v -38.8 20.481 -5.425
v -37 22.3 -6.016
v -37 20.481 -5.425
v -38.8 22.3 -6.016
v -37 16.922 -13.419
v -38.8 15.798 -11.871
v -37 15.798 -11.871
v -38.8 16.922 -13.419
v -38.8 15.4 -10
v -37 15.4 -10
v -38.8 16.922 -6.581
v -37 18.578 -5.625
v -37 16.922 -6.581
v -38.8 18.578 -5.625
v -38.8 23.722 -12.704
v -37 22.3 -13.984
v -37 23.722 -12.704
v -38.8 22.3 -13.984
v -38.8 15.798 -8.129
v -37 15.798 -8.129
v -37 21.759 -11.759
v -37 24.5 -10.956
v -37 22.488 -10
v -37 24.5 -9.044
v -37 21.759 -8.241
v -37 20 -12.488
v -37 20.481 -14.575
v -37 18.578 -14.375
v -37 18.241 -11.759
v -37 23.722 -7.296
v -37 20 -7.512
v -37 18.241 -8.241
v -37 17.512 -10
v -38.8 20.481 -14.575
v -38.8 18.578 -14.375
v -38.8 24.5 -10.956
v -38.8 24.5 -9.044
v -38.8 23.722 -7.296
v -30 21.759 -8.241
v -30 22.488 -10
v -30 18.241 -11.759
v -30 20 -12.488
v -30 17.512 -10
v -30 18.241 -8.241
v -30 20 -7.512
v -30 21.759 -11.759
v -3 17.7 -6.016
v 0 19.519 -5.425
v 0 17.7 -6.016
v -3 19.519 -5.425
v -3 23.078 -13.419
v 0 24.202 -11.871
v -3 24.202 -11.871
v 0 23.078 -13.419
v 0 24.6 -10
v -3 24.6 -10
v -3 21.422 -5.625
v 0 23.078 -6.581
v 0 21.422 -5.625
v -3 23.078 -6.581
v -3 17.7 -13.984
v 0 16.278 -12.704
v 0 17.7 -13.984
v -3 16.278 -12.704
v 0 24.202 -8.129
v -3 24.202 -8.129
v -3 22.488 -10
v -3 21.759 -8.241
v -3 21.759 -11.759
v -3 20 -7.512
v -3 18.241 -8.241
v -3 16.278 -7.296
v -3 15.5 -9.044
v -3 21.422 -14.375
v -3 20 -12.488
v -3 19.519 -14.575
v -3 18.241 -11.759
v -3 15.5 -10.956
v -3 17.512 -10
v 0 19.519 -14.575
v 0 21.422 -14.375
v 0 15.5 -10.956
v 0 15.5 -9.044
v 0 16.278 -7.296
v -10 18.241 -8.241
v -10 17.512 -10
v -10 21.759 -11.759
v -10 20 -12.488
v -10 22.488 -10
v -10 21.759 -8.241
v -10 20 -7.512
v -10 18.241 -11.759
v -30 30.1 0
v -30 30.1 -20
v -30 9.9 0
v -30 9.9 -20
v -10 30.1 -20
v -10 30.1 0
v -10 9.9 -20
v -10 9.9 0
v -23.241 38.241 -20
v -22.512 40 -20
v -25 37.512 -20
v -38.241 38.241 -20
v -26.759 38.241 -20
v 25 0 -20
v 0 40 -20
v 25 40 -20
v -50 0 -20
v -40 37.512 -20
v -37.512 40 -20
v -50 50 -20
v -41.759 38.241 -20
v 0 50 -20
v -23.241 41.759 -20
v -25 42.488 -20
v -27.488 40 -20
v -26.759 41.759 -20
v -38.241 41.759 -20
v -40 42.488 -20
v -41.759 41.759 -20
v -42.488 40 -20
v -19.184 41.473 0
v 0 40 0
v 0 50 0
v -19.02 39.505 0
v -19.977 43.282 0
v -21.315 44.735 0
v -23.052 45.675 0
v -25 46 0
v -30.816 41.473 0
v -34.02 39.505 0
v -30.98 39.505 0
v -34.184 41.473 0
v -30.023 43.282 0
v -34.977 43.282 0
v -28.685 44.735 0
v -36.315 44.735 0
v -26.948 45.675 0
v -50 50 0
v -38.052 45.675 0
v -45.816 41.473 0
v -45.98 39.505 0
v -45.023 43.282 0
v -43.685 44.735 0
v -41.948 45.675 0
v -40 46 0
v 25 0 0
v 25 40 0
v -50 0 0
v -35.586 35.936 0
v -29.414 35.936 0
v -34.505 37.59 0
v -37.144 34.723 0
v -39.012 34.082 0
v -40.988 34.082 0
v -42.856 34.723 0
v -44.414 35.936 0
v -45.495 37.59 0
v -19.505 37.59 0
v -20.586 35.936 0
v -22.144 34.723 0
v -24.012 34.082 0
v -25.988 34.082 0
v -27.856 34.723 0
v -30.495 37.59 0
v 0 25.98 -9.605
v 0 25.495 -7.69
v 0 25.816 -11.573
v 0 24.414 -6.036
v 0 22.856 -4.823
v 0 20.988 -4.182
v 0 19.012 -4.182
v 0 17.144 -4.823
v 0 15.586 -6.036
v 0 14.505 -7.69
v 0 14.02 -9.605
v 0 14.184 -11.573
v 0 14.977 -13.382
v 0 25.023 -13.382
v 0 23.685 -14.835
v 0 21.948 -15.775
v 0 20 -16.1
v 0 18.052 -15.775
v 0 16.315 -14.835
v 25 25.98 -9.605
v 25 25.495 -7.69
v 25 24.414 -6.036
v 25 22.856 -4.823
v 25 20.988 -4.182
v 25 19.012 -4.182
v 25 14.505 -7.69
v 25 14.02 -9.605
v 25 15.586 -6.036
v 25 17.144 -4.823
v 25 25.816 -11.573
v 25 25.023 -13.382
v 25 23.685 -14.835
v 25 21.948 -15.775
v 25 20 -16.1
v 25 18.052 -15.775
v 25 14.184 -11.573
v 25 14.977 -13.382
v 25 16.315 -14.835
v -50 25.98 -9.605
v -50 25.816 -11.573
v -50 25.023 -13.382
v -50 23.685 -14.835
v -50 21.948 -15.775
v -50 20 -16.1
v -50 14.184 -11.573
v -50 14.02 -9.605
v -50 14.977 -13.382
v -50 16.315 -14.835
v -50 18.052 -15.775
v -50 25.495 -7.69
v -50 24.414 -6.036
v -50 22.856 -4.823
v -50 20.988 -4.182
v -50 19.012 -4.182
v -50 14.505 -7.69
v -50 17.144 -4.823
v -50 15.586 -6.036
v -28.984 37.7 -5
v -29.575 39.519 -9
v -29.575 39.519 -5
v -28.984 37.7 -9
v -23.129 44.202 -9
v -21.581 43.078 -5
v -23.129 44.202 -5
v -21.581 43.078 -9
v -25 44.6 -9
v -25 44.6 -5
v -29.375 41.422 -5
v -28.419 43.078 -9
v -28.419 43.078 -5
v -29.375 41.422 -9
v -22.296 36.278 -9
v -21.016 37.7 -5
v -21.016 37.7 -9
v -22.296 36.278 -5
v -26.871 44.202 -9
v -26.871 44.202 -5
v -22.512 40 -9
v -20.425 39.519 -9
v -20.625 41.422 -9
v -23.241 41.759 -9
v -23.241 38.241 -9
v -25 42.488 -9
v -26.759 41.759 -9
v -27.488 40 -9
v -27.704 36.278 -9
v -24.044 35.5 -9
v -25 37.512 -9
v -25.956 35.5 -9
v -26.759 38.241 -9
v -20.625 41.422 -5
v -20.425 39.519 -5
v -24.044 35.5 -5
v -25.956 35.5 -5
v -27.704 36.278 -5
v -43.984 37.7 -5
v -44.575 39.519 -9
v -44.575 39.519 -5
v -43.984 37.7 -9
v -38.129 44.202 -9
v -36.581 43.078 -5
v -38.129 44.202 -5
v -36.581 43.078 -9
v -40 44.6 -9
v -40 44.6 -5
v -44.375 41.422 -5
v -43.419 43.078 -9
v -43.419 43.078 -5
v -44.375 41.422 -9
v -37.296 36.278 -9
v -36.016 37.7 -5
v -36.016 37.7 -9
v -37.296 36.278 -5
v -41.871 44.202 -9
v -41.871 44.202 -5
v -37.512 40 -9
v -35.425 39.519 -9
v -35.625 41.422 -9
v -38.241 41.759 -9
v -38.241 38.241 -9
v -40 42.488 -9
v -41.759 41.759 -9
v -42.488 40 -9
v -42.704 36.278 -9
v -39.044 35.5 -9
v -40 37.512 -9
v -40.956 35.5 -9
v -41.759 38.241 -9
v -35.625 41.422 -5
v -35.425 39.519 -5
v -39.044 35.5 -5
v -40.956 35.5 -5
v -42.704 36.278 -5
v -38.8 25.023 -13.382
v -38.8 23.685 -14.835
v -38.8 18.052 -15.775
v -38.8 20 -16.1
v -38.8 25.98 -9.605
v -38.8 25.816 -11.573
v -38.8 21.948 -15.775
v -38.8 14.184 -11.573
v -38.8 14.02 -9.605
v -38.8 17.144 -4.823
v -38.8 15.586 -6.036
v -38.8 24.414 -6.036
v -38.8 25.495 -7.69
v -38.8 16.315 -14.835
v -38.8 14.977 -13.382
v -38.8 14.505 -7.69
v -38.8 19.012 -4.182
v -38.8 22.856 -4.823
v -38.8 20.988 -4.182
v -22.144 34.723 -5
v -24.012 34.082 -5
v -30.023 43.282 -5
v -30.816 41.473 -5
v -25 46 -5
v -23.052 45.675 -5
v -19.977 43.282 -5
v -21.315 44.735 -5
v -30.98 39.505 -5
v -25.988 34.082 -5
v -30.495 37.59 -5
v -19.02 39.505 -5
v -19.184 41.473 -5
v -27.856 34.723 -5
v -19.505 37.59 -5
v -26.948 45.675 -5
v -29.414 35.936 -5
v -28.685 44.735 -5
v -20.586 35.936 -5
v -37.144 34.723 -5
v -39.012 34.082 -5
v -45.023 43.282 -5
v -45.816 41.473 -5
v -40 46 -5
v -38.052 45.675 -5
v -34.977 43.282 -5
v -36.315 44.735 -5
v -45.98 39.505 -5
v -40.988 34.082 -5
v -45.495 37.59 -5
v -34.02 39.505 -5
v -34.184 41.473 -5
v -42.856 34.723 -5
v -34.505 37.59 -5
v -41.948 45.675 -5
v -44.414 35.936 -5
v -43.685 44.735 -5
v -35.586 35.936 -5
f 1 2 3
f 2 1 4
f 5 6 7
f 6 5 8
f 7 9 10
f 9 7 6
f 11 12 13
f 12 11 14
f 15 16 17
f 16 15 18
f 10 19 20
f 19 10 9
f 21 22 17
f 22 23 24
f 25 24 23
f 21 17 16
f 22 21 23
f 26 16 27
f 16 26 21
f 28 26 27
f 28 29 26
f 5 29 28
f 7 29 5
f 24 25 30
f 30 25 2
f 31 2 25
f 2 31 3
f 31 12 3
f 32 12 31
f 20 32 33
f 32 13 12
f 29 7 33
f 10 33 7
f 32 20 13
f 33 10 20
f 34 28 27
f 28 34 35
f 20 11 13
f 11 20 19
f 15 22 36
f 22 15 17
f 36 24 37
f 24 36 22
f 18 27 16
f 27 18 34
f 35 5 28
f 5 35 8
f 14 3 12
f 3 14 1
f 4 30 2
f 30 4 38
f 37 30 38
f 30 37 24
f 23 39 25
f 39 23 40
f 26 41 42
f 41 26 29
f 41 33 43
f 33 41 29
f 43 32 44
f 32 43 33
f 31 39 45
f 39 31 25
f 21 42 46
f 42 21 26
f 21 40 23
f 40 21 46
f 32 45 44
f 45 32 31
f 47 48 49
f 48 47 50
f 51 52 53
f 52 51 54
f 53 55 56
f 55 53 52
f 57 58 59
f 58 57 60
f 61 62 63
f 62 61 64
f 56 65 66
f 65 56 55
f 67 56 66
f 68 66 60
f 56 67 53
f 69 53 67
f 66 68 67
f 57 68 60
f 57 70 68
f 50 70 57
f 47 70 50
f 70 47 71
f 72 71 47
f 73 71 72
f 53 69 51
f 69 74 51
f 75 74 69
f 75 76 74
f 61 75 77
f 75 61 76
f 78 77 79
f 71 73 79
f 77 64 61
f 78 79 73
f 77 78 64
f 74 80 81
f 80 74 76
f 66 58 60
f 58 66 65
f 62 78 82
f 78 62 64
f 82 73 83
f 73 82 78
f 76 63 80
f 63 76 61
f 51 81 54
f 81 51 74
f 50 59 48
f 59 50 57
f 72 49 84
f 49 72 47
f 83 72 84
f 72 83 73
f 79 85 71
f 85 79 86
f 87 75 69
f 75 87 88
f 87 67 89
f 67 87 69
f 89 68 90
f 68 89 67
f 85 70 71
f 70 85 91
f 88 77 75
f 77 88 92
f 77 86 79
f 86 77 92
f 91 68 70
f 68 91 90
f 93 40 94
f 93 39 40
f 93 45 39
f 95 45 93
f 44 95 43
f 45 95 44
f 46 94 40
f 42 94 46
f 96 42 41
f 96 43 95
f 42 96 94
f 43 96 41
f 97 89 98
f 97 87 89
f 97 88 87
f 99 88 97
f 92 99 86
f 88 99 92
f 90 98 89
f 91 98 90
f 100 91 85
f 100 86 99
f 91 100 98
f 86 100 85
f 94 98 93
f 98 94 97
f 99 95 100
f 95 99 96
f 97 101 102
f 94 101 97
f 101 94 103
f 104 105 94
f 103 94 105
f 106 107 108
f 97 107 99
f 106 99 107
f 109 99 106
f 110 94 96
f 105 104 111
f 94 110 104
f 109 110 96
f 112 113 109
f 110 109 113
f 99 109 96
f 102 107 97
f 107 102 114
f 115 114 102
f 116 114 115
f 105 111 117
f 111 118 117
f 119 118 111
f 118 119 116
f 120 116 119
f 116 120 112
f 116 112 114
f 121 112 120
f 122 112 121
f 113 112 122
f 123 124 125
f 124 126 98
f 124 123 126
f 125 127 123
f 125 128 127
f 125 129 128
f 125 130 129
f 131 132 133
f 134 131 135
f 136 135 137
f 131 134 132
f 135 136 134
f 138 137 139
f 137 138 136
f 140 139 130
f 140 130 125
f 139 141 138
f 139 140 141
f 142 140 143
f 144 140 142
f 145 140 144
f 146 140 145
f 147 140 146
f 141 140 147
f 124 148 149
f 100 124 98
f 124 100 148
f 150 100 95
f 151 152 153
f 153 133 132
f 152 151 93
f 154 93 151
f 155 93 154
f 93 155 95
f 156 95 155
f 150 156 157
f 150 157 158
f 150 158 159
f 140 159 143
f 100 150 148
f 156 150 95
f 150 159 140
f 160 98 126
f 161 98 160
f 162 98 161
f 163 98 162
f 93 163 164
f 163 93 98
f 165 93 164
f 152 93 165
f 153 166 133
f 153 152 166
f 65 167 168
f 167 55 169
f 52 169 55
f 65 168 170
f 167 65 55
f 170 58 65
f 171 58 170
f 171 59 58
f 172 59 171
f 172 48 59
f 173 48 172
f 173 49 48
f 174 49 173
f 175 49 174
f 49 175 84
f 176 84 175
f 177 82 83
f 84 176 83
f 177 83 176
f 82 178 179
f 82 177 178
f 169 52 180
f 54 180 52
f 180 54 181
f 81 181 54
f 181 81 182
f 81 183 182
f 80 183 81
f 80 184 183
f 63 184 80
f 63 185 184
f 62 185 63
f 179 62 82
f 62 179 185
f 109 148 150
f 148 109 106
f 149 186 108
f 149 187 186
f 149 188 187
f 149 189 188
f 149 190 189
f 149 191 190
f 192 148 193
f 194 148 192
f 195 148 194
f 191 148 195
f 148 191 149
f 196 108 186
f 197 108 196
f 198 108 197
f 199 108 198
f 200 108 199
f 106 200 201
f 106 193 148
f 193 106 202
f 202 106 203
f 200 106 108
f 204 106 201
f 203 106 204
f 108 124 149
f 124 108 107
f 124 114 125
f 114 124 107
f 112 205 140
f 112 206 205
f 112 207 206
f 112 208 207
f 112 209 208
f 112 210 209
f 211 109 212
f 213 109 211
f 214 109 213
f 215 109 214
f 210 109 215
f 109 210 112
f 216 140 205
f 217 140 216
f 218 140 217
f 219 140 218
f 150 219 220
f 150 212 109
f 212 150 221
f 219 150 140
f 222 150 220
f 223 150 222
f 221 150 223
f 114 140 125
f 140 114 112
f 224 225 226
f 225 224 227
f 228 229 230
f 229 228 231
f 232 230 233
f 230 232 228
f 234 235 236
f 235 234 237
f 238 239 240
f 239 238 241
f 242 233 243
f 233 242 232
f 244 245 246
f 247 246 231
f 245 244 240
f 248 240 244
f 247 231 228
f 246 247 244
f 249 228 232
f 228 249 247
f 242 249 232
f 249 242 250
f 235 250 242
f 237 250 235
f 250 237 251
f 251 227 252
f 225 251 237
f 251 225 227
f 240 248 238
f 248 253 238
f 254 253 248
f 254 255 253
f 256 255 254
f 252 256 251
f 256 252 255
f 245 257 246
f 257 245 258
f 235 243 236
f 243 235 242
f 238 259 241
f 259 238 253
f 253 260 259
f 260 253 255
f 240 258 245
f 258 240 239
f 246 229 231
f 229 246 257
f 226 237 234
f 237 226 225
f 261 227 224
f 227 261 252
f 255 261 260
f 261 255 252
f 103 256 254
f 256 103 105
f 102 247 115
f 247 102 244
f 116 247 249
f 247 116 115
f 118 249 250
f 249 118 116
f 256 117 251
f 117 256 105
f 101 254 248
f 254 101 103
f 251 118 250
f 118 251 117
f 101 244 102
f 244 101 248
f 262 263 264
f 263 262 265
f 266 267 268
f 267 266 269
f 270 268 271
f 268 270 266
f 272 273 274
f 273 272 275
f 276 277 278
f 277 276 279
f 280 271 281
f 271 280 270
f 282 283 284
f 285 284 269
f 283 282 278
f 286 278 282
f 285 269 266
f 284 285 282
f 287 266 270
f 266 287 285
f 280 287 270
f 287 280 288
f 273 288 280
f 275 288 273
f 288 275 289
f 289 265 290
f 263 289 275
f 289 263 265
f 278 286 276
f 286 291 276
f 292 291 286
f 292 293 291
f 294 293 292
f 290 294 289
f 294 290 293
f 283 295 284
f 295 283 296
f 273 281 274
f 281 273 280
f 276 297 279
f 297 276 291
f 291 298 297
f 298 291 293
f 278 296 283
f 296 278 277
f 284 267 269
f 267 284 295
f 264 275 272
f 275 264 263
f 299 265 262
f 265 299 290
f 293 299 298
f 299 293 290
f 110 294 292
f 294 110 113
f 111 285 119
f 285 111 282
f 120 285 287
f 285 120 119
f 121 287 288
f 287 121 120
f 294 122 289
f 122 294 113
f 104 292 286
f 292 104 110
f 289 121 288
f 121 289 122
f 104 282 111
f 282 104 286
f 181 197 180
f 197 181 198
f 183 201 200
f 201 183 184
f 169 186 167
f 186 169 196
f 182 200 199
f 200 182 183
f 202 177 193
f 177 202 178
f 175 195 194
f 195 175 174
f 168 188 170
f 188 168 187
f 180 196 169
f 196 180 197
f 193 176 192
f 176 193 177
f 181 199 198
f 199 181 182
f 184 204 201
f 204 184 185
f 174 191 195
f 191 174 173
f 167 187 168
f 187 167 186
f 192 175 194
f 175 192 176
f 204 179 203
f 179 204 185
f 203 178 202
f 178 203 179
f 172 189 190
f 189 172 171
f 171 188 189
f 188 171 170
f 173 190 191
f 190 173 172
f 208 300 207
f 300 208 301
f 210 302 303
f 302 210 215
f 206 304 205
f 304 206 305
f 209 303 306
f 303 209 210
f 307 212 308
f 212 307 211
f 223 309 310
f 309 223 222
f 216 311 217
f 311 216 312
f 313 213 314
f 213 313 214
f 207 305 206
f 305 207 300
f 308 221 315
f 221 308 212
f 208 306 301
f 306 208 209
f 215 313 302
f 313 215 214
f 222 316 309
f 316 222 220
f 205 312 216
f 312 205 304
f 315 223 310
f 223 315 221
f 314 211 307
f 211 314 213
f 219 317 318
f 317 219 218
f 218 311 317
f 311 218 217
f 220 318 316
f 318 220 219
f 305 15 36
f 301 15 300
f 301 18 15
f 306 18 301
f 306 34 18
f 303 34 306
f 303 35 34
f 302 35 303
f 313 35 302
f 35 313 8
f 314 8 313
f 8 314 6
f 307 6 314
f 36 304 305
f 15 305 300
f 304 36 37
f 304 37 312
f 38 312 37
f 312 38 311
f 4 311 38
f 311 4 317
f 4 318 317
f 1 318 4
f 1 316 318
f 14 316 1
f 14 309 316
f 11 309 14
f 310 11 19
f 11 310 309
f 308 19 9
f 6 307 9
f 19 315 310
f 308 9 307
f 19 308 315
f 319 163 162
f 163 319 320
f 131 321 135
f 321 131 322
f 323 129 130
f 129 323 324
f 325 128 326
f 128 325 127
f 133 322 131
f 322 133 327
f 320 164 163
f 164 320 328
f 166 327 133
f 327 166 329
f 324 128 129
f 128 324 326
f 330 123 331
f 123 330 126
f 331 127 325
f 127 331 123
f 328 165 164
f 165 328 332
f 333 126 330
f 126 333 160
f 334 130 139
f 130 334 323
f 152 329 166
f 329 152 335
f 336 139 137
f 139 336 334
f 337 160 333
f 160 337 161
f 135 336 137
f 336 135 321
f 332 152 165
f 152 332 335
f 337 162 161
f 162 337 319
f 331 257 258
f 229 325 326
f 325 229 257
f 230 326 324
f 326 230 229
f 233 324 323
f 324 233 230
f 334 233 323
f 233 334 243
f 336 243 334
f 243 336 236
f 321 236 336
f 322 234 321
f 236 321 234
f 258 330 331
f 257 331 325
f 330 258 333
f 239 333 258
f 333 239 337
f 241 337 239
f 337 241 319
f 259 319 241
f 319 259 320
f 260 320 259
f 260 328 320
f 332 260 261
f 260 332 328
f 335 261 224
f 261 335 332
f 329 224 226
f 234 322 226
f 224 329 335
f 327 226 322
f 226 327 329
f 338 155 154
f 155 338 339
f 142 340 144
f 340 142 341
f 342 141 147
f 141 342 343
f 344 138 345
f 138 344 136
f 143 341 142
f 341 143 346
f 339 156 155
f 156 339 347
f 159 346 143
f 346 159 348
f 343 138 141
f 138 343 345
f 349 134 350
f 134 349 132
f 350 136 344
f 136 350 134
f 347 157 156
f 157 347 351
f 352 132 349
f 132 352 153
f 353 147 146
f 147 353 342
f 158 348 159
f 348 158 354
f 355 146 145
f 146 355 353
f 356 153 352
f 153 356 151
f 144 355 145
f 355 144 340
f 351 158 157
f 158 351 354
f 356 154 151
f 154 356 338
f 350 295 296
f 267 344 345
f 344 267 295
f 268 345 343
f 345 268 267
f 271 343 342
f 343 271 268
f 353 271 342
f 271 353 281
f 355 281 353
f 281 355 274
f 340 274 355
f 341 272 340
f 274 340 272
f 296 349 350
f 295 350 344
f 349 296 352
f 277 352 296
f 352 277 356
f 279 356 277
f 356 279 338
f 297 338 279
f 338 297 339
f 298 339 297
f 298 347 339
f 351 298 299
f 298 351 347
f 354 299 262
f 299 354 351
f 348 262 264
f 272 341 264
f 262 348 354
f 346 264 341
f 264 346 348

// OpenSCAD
// file: MCAD/constants.scad
// MIT license


TAU = 6.2831853071; //2*PI, see http://tauday.com/
PI = TAU/2;

// translates a imperial measurement in inches to meters
mm_per_inch = 25.4;
// file: MCAD/math.scad
// MIT license

include <constants.scad>

function deg(angle) = 360*angle/TAU;
// file: bom.scad
module bom(code, desc, category) {
	echo(str("BOM: ",code," - ", desc, "; ", category));
}
// file: MCAD/shapes.scad
/*
 *  OpenSCAD Shapes Library (www.openscad.org)
 *  Copyright (C) 2009  Catarina Mota
 *  Copyright (C) 2010  Elmo Mäntynen
 *
 *  License: LGPL 2.1 or later
*/

// 2D Shapes
//ngon(sides, radius, center=false);

// 3D Shapes
//box(width, height, depth);
//roundedBox(width, height, depth, factor);
//cone(height, radius);
//ellipticalCylinder(width, height, depth);
//ellipsoid(width, height);
//tube(height, radius, wall, center = false);
//tube2(height, ID, OD, center = false);
//ovalTube(width, height, depth, wall, center = false);
//hexagon(height, depth);
//octagon(height, depth);
//dodecagon(height, depth);
//hexagram(height, depth);
//rightTriangle(adjacent, opposite, depth);
//equiTriangle(side, depth);
//12ptStar(height, depth);

//----------------------

// size is a vector [w, h, d]
module box(width, height, depth) {
  cube([width, height, depth], true);
}

// size is a vector [w, h, d]
module roundedBox(width, height, depth, radius) {
  size=[width, height, depth];
  cube(size - [2*radius,0,0], true);
  cube(size - [0,2*radius,0], true);
  for (x = [radius-size[0]/2, -radius+size[0]/2],
       y = [radius-size[1]/2, -radius+size[1]/2]) {
    translate([x,y,0]) cylinder(r=radius, h=size[2], center=true);
  }
}

module cone(height, radius, center = false) {
  cylinder(height, radius, 0, center);
}

module ellipticalCylinder(w,h, height, center = false) {
  scale([1, h/w, 1]) cylinder(h=height, r=w, center=center);
}

module ellipsoid(w, h, center = false) {
  scale([1, h/w, 1]) sphere(r=w/2, center=center);
}

// wall is wall thickness
module tube(height, radius, wall, center = false) {
  difference() {
    cylinder(h=height, r=radius, center=center);
    cylinder(h=height, r=radius-wall, center=center);
  }
}

// wall is wall thickness
module tube2(height, ID, OD, center = false) {
  difference() {
    cylinder(h=height, r=OD/2, center=center);
    cylinder(h=height, r=ID/2, center=center);
  }
}

// wall is wall thickness
module ovalTube(height, rx, ry, wall, center = false) {
  difference() {
    scale([1, ry/rx, 1]) cylinder(h=height, r=rx, center=center);
    scale([(rx-wall)/rx, (ry-wall)/rx, 1]) cylinder(h=height, r=rx, center=center);
  }
}

// size is the XY plane size, height in Z
module hexagon(size, height) {
  boxWidth = size/1.75;
  for (r = [-60, 0, 60]) rotate([0,0,r]) cube([boxWidth, size, height], true);
}

// size is the XY plane size, height in Z
module octagon(size, height) {
  intersection() {
    cube([size, size, height], true);
    rotate([0,0,45]) cube([size, size, height], true);
  }
}

// size is the XY plane size, height in Z
module dodecagon(size, height) {
  intersection() {
    hexagon(size, height);
    rotate([0,0,90]) hexagon(size, height);
  }
}

// size is the XY plane size, height in Z
module hexagram(size, height) {
  boxWidth=size/1.75;
  for (v = [[0,1],[0,-1],[1,-1]]) {
    intersection() {
      rotate([0,0,60*v[0]]) cube([size, boxWidth, height], true);
      rotate([0,0,60*v[1]]) cube([size, boxWidth, height], true);
    }
  }
}

module rightTriangle(adjacent, opposite, height) {
  difference() {
    translate([-adjacent/2,opposite/2,0]) cube([adjacent, opposite, height], true);
    translate([-adjacent,0,0]) {
      rotate([0,0,atan(opposite/adjacent)]) dislocateBox(adjacent*2, opposite, height+2);
    }
  }
}

module equiTriangle(side, height) {
  difference() {
    translate([-side/2,side/2,0]) cube([side, side, height], true);
    rotate([0,0,30]) dislocateBox(side*2, side, height);
    translate([-side,0,0]) {
      rotate([0,0,60]) dislocateBox(side*2, side, height);
    }
  }
}

module 12ptStar(size, height) {
  starNum = 3;
  starAngle = 360/starNum;
  for (s = [1:starNum]) {
    rotate([0, 0, s*starAngle]) cube([size, size, height], true);
  }
}

//-----------------------
//MOVES THE ROTATION AXIS OF A BOX FROM ITS CENTER TO THE BOTTOM LEFT CORNER
module dislocateBox(w, h, d) {
  translate([0,0,-d/2]) cube([w,h,d]);
}

//-----------------------
// Tests
//module test2D_ellipse(){ellipse(10, 5);}
module test_ellipsoid(){ellipsoid(10, 5);}

//module test2D_egg_outline(){egg_outline();}
// file: MCAD/motors.scad
// Copyright 2010 D1plo1d

// This library is dual licensed under the GPL 3.0 and the GNU Lesser General Public License as per http://creativecommons.org/licenses/LGPL/2.1/ .

include <math.scad>


//generates a motor mount for the specified nema standard #.
module stepper_motor_mount(nema_standard,slide_distance=0, mochup=true, tolerance=0) {
	//dimensions from:
	// http://www.numberfactory.com/NEMA%20Motor%20Dimensions.htm
	if (nema_standard == 17)
	{
		_stepper_motor_mount(
			motor_shaft_diameter = 0.1968*mm_per_inch,
			motor_shaft_length = 0.945*mm_per_inch,
			pilot_diameter = 0.866*mm_per_inch,
			pilot_length = 0.80*mm_per_inch,
			mounting_bolt_circle = 1.725*mm_per_inch,
			bolt_hole_size = 3.5,
			bolt_hole_distance = 1.220*mm_per_inch,
			slide_distance = slide_distance,
			mochup = mochup,
			tolerance=tolerance);
	}
	if (nema_standard == 23)
	{
		_stepper_motor_mount(
			motor_shaft_diameter = 0.250*mm_per_inch,
			motor_shaft_length = 0.81*mm_per_inch,
			pilot_diameter = 1.500*mm_per_inch,
			pilot_length = 0.062*mm_per_inch,
			mounting_bolt_circle = 2.625*mm_per_inch,
			bolt_hole_size = 0.195*mm_per_inch,
			bolt_hole_distance = 1.856*mm_per_inch,
			slide_distance = slide_distance,
			mochup = mochup,
			tolerance=tolerance);
	}
	
}


//inner mehod for creating a stepper motor mount of any dimensions
module _stepper_motor_mount(
	motor_shaft_diameter,
	motor_shaft_length,
	pilot_diameter,
	pilot_length,
	mounting_bolt_circle,
	bolt_hole_size,
	bolt_hole_distance,
	slide_distance = 0,
	motor_length = 40, //arbitray - not standardized
	mochup,
	tolerance = 0
)
{
	union()
	{
	// == centered mount points ==
	//mounting circle inset
	translate([0,slide_distance/2,0]) circle(r = pilot_diameter/2 + tolerance);
	square([pilot_diameter,slide_distance],center=true);
	translate([0,-slide_distance/2,0]) circle(r = pilot_diameter/2 + tolerance);

	//todo: motor shaft hole
	
	//mounting screw holes
	for (x = [-1,1])
	{
		for (y = [-1,1])
		{
			translate([x*bolt_hole_distance/2,y*bolt_hole_distance/2,0])
			{
				translate([0,slide_distance/2,0]) circle(bolt_hole_size/2 + tolerance);
				translate([0,-slide_distance/2,0]) circle(bolt_hole_size/2 + tolerance);
				square([bolt_hole_size+2*tolerance,slide_distance],center=true);
			}
		}
	}
	// == motor mock-up ==
	//motor box
	if (mochup == true)
	{
		%translate([0,0,-5]) cylinder(h = 5, r = pilot_diameter/2);
		%translate(v=[0,0,-motor_length/2])
		{
			cube(size=[bolt_hole_distance+bolt_hole_size+5,bolt_hole_distance+bolt_hole_size+5,motor_length], center = true);
		}
		//shaft
		%translate(v=[0,0,-(motor_length-motor_shaft_length-2)/2])
		{
			%cylinder(r=motor_shaft_diameter/2,h=motor_length+motor_shaft_length--1, center = true);
		}
	}
	}
}
// file: MCAD/materials.scad
/*
 * Material colors.
 * 
 * Originally by Hans Häggström, 2010.
 * Dual licenced under Creative Commons Attribution-Share Alike 3.0 and LGPL2 or later
 */

// Material colors
Oak = [0.65, 0.5, 0.4];
Pine = [0.85, 0.7, 0.45];
Birch = [0.9, 0.8, 0.6];
FiberBoard = [0.7, 0.67, 0.6];
BlackPaint = [0.2, 0.2, 0.2];
Iron = [0.36, 0.33, 0.33];
Steel = [0.65, 0.67, 0.72];
Stainless = [0.45, 0.43, 0.5];
Aluminum = [0.77, 0.77, 0.8];
Brass = [0.88, 0.78, 0.5];
Transparent = [1, 1, 1, 0.2];

// Example, uncomment to view
//color_demo();

module color_demo(){
    // Wood
    colorTest(Oak, 0, 0);
    colorTest(Pine, 1, 0);
    colorTest(Birch, 2, 0);

    // Metals
    colorTest(Iron, 0, 1);
    colorTest(Steel, 1, 1);
    colorTest(Stainless, 2, 1);
    colorTest(Aluminum, 3, 1);

    // Mixboards
    colorTest(FiberBoard, 0, 2);

    // Paints
    colorTest(BlackPaint, 0, 3);
}

module colorTest(col, row=0, c=0) {
  color(col) translate([row * 30,c*30,0]) sphere(r=10);
}
// file: MCAD/units.scad
/*
 * Basic units.
 * 
 * Originally by Hans Häggström, 2010.
 * Dual licenced under Creative Commons Attribution-Share Alike 3.0 and LGPL2 or later
 */


mm = 1;
cm = 10 * mm;
dm = 100 * mm;
m = 1000 * mm;

inch = 25.4 * mm;

X = [1, 0, 0];
Y = [0, 1, 0];
Z = [0, 0, 1];

M3 = 3*mm;
M4 = 4*mm;
M5 = 5*mm;
M6 = 6*mm;
M8 = 8*mm;


// When a small distance is needed to overlap shapes for boolean cutting, etc.
epsilon = 0.01*mm;
// file: vslot.scad
include <MCAD/units.scad>;
include <MCAD/materials.scad>
use <MCAD/shapes.scad>;
use <bom.scad>;

vslot_color_black = [0.27, 0.27, 0.3];
vslot_color = Aluminum;

module vslot(length=50, sections=1, finish, cutout=0) {
	size = sections * 20;
	bom(str("vslot20x", size, "x", length), str("v-slot 20x", size, " (", length , "mm)"), ["rail", "extrusion", "structure"]);
	cutext = [[12.00,4.50],[10.00,4.50],[8.20,2.78],[8.20,5.50],[6.56,5.50],[3.90,2.84],[3.90,0.21],[3.69,0.00],[3.90,-0.21],[3.90,-2.84],[6.56,-5.50],[8.20,-5.50],[8.20,-2.78],[10.00,-4.50],[12.00,-4.50]];
	cutint = [[16.10,0.21],[16.10,2.84],[12.70,6.24],[12.70,8.78],[7.30,8.78],[7.30,6.24],[3.90,2.84],[3.90,0.21],[3.69,0.00],[3.90,-0.21],[3.90,-2.84],[7.30,-6.24],[7.30,-8.78],[12.70,-8.78],[12.70,-6.24],[16.10,-2.84],[16.10,-0.21],[16.31,0.00],];
	cutcorner = [[8.20,8.20],[6.57,8.20],[6.57,7.66],[7.66,6.57],[8.20,6.57]];

	module profile() {
        
		difference() {
         
			translate([0,0,length/2])
			roundedBox(20 * sections, 20, length, 1.5);
         if (cutout == 0){
			for(i = [0,180]) rotate([0,0,-i]) translate([10 * (sections - 1), 0, -epsilon/2]) {
				linear_extrude(length+20) polygon(cutext);
				translate([5,-2.89,-20]) cube([10,5.78,length+40]);
			}
          
			for(i = [90,270]) rotate([0,0,-i])
				for(j = [0:sections-1]) translate([0, (sections - 1) * 10 - 20 * j, -epsilon/2]) {
					linear_extrude(length+epsilon) polygon(cutext);
					translate([5,-2.89,-20]) cube([10,5.78,length+40]);
				}

			for(i = [0:sections-1]) translate([i * 20 - 10 * (sections - 1),0,-epsilon/2])
				cylinder(length+20, 2.1, 2.1);

			for(i = [90,270]) rotate([0,0,-i])
				translate([0,(sections - 1) * 10,-epsilon/2])
				linear_extrude(length+epsilon) polygon(cutcorner);
			for(i = [ 0,180]) rotate([0,0,-i])
				translate([(sections - 1) * 10,0,-epsilon/2])
				linear_extrude(length+epsilon) polygon(cutcorner);

			if(sections > 1)
				for(i = [0:sections-2]) translate([(sections - 3) * 10 - i * 20, 0, -epsilon/2])
					linear_extrude(length+epsilon) polygon(cutint);
                      }
		}
	}

      if (cutout == 1){
		 translate([0,0,length/2]) box(20 * sections, 20.2, length);
          } else {
	     if(finish)
		   color(finish) profile();
	     else
		   color(vslot_color) profile();
         }
}

module vslot20x20(length, finish) { vslot(length, 1, finish); }
module vslot20x20_cutout(length, finish) { vslot(length, 1, finish, 1); }


module vslot20x40(length, finish) { vslot(length, 2, finish); }
module vslot20x40_cutout(length, finish) { vslot(length, 2, finish, 1); }

module vslot20x60(length, finish) { vslot(length, 3, finish); }
module vslot20x60_cutout(length, finish) { vslot(length, 3, finish, 1); }

module vslot20x80(length, finish) { vslot(length, 4, finish); }
module vslot20x80_cutout(length, finish) { vslot(length, 4, finish, 1); }


module vslot_test() {
	$fn = 32;

	vslot20x20(100);

	translate([0, 40, 0])
	vslot20x40(100, vslot_color_black);

	translate([0, 80, 0])
	vslot20x60(100);

	translate([0, 120, 0])
	vslot20x80(100, vslot_color_black);

    translate([0,140,0]) vslot20x20_cutout(100);
}

vslot_test();
// file: MCAD/nuts_and_bolts.scad
// Copyright 2010 D1plo1d

// This library is dual licensed under the GPL 3.0 and the GNU Lesser General Public License as per http://creativecommons.org/licenses/LGPL/2.1/ .

//testNutsAndBolts();

module SKIPtestNutsAndBolts()
{
	$fn = 360;
	translate([0,15])nutHole(3, proj=2);
	boltHole(3, length= 30, proj=2);
}

MM = "mm";
INCH = "inch"; //Not yet supported

//Based on: http://www.roymech.co.uk/Useful_Tables/Screws/Hex_Screws.htm
METRIC_NUT_AC_WIDTHS =
[
	-1, //0 index is not used but reduces computation
	-1,
	-1,
	6.40,//m3
	8.10,//m4
	9.20,//m5
	11.50,//m6
	-1,
	15.00,//m8
	-1,
	19.60,//m10
	-1,
	22.10,//m12
	-1,
	-1,
	-1,
	27.70,//m16
	-1,
	-1,
	-1,
	34.60,//m20
	-1,
	-1,
	-1,
	41.60,//m24
	-1,
	-1,
	-1,
	-1,
	-1,
	53.1,//m30
	-1,
	-1,
	-1,
	-1,
	-1,
	63.5//m36
];
METRIC_NUT_THICKNESS =
[
	-1, //0 index is not used but reduces computation
	-1,
	-1,
	2.40,//m3
	3.20,//m4
	4.00,//m5
	5.00,//m6
	-1,
	6.50,//m8
	-1,
	8.00,//m10
	-1,
	10.00,//m12
	-1,
	-1,
	-1,
	13.00,//m16
	-1,
	-1,
	-1,
	16.00//m20
	-1,
	-1,
	-1,
	19.00,//m24
	-1,
	-1,
	-1,
	-1,
	-1,
	24.00,//m30
	-1,
	-1,
	-1,
	-1,
	-1,
	29.00//m36
];

COURSE_METRIC_BOLT_MAJOR_THREAD_DIAMETERS =
[//based on max values
	-1, //0 index is not used but reduces computation
	-1,
	-1,
	2.98,//m3
	3.978,//m4
	4.976,//m5
	5.974,//m6
	-1,
	7.972,//m8
	-1,
	9.968,//m10
	-1,
	11.966,//m12
	-1,
	-1,
	-1,
	15.962,//m16
	-1,
	-1,
	-1,
	19.958,//m20
	-1,
	-1,
	-1,
	23.952,//m24
	-1,
	-1,
	-1,
	-1,
	-1,
	29.947,//m30
	-1,
	-1,
	-1,
	-1,
	-1,
	35.940//m36
];

module nutHole(size, units=MM, tolerance = +0.0001, proj = -1)
{
	//takes a metric screw/nut size and looksup nut dimensions
	radius = METRIC_NUT_AC_WIDTHS[size]/2+tolerance;
	height = METRIC_NUT_THICKNESS[size]+tolerance;
	if (proj == -1)
	{
		cylinder(r= radius, h=height, $fn = 6, center=[0,0]);
	}
	if (proj == 1)
	{
		circle(r= radius, $fn = 6);
	}
	if (proj == 2)
	{
		translate([-radius/2, 0])
			square([radius*2, height]);
	}
}

module boltHole(size, units=MM, length, tolerance = +0.0001, proj = -1)
{
	radius = COURSE_METRIC_BOLT_MAJOR_THREAD_DIAMETERS[size]/2+tolerance;
//TODO: proper screw cap values
	capHeight = METRIC_NUT_THICKNESS[size]+tolerance; //METRIC_BOLT_CAP_HEIGHTS[size]+tolerance;
	capRadius = METRIC_NUT_AC_WIDTHS[size]/2+tolerance; //METRIC_BOLT_CAP_RADIUS[size]+tolerance;

	if (proj == -1)
	{
	translate([0, 0, -capHeight])
		cylinder(r= capRadius, h=capHeight);
	cylinder(r = radius, h = length);
	}
	if (proj == 1)
	{
		circle(r = radius);
	}
	if (proj == 2)
	{
		translate([-capRadius/2, -capHeight])
			square([capRadius*2, capHeight]);
		square([radius*2, length]);
	}
}
// file: pulley.scad
use <MCAD/nuts_and_bolts.scad>;

module pulley_wall(xside)
{
   hull(){
       translate([0,0,0]) cube([20,3,2]);
       translate([8.5,0,18]) cube([3,3,2]);
       if (xside==0){
          translate([8.5,7,0]) cube([1,1,1]);
          translate([10,4,9]) rotate([90,0,0]) cylinder(r=3,h=10);
          
         } else {
          translate([8.5,-5,0]) cube([1,1,1]);
          translate([10,8,9]) rotate([90,0,0]) cylinder(r=3,h=10);
         }
       }
    
}

module pulley_body()
{
    translate([0,0,0])   pulley_wall(1);
    translate([0,22,0])  pulley_wall(0);
    %translate([10,-2,9]) rotate([90,0,180]) boltHole(3,length=28);
    %translate([10,27,9]) rotate([90,0,180]) nutHole(3); 
}

module pulley_cuts()
{
    translate([10,-2,9]) rotate([90,0,180]) boltHole(3,length=28);
    translate([10,25,9]) rotate([90,0,180]) nutHole(3);  
}

module pulley()
{
	difference(){
        translate([23,21,-12]) rotate([90,0,270]) pulley_body();
        translate([23,21,-12]) rotate([90,0,270]) pulley_cuts();
        }
    

}



pulley();
// file: nemamount.scad
include <MCAD/units.scad>;
include <MCAD/materials.scad>
include <MCAD/stepper.scad>
include <MCAD/motors.scad>
use <MCAD/shapes.scad>;
$fn = 32;




module motor_support(ht)
{
   difference(){
	  translate([-22.5,23.5,0]) rotate([90,0,0]) motor_support_body(ht);
      translate([0,1,0]) rotate([90,0,0]) motor_support_cuts(ht);
      }
}

module motor_support_body(ht)
{
	cube([45,ht,48.5]);

}


module motor_support_cuts(ht)
{
// Motor shaft/pulley cutout.
      translate([0,.1,0]) rotate([90, 0, 0]) cylinder(r=12, h=ht*2, center=true, $fn=60);
      // NEMA 17 stepper motor mounting screws.
      for (x = [-1, 1]) for (z = [-1, 1]) {
        scale([x, 1, z]) translate([15.5, .1, 15.5]) {
          rotate([90, 0, 0]) cylinder(r=4, h=ht*2, center=true, $fn=12);
          }
        }
}



module nema_geared_cutout()
{
    //pulley opening
    translate([16,1,21]) rotate([90,0,0]){
      cylinder (h=22, r=6.6);

      rotate([0,0,45]) {
        translate([14,0,0]) cylinder(h=22, r=1.6, $fn=12);
        translate([0,14,0]) cylinder(h=22, r=1.6, $fn=12);
        translate([-14,0,0]) cylinder(h=22, r=1.6, $fn=12);
        translate([0,-14,0]) cylinder(h=22, r=1.6, $fn=12);
      }
     
    }

    //gearhead indentation
    translate([16,-5,21]) rotate([90,0,0]) cylinder (h=3.35, r=11.25);

  
    
}

module nema_cutout()
{
// Motor shaft/pulley cutout.
      rotate([90, 0, 0]) cylinder(r=12, h=20, center=true, $fn=60);
      // NEMA 17 stepper motor mounting screws.
      for (x = [-1, 1]) for (z = [-1, 1]) {
        scale([x, 1, z]) translate([15.5, -5, 15.5]) {
          rotate([90, 0, 0]) cylinder(r=1.65, h=20, center=true, $fn=12);
          }
        }
}

module nema_motor()
{
   union(){
     nema_mount();
     %translate([0,-4,1]) rotate([90,0,0]) motor(Nema17, size=NemaLong , dualAxis=false);
     }
}

module nema_motor_inverse()
{
   union(){
     nema_mount_inverse();
     %translate([0,-4,1]) rotate([90,0,0]) motor(Nema17, size=NemaLong , dualAxis=false);
     }
}

module nema_geared_motor_inverse()
{
   union(){
     nema_geared_inverse();
     %translate([16,-7,22]) rotate([90,0,180]) motor(Nema17, NemaLong, dualAxis=false);
    
     }
}

module nema_geared_motor()
{
   union(){
     nema_geared_mount();
     %translate([16,-7,22]) rotate([90,0,180]) motor(Nema17, NemaLong, dualAxis=false);
    
     }
}

module nema_geared_mount()
{
   difference(){
      union(){
           translate([-6,-6,0]) rotate([90,0,0]) cube([45,45,7]);
           translate([-6,-13,-4]) rotate([0,0,0]) cube([45,25,5]);
           translate([-6,-13,44]) rotate([0,0,0]) cube([45,25,5]);
           }
      translate([0,0,1]) nema_geared_cutout();
      }


}

module nema_geared_inverse()
{
   difference(){
      union(){
           translate([-6,-6,0]) rotate([90,0,0]) cube([45,45,7]);
           translate([-6,-31,-4]) rotate([0,0,0]) cube([45,25,5]);
           translate([-6,-31,44]) rotate([0,0,0]) cube([45,25,5]);
           }
      translate([0,0,1]) nema_geared_cutout();
      }


}

module nema_mount_inverse()
{
   difference(){
      union(){
        translate([-22.5,0,-21.5]) rotate([90,0,0]) cube([45,45,5]);
        translate([-22.5,-5,-25]) rotate([0,0,0]) cube([45,25,5]);
        }
      translate([0,0,1]) nema_cutout();
      }
   //nema_cutout();
}

module nema_mount()
{
   difference(){
      union(){
        translate([-22.5,0,-21.5]) rotate([90,0,0]) cube([45,45,5]);
        translate([-22.5,-25,-25]) rotate([0,0,0]) cube([45,25,5]);
        }
      translate([0,0,1]) nema_cutout();
      }
   //nema_cutout();
}

//nema_motor_inverse();
translate([0,0,40]) rotate([270,0,0]) nema_motor();
translate([0,0,0]) motor_support(40);
//nema_geared_motor();
//nema_geared_motor_inverse();
// file: mountblock.scad
use <vslot.scad>;
use <MCAD/nuts_and_bolts.scad>;


module mountblock_body()
{
	cube([40,40,20]);
	translate([20,20,0]) %vslot20x20(200);
     %translate([37,20,10]) rotate([90,0,270]) boltHole(5, length=18);
     %translate([3,20,10]) rotate([90,0,90]) boltHole(5, length=18);
}


module mountblock_cuts()
{
	translate([20,20,-0.2]) vslot20x20_cutout(80.1);
    translate([37,20,10]) rotate([90,0,270]) boltHole(5, length=18);
    translate([3,20,10]) rotate([90,0,90]) boltHole(5, length=18);
}


module mountblock()
{
	difference(){
         mountblock_body();
         mountblock_cuts();
         }

}


mountblock();
// main file
use <mountblock.scad>;
use <nemamount.scad>;
use <pulley.scad>;
use <MCAD/nuts_and_bolts.scad>;

module bxmotor_body()
{
	translate([0,0,0]) rotate([0,180,0]) mountblock();
    translate([0,0,-20]) cube([25,40,20]);
    %translate([20,20,-10]) rotate([0,90,0]) cylinder(r=6,h=45.2);
    translate([0,40,0]) rotate([0,180,0])cube([50,10,20]);
    translate([-40,0,0]) rotate([0,180,0])cube([10,40,20]);
    %translate([-25,40,-3]) rotate([0,180,270]) boltHole(5, length=20);
    %translate([-40,40,-3]) rotate([0,180,270]) boltHole(5, length=20);

   
    
}

module bxmotor_cuts()
{
     translate([0,20,-10.1]) rotate([0,90,0]) cylinder(r=6,h=26.2);
     translate([0,20,-10.1]) rotate([0,90,0]) cylinder(r=6,h=26.2);
     translate([-65,20,-10.1]) rotate([0,90,0]) cylinder(r=6,h=26.2);
     translate([-25,40,0]) rotate([0,180,270]) cylinder(r=6, h=5);
     translate([-40,40,0]) rotate([0,180,270]) cylinder(r=6, h=5);
     translate([-25,40,-9]) rotate([0,180,270]) boltHole(5, length=12);
     translate([-40,40,-9]) rotate([0,180,270]) boltHole(5, length=12);
     
}

module bxmotor()
{
	difference(){
       bxmotor_body();
       bxmotor_cuts();
       }

}

bxmotor();
